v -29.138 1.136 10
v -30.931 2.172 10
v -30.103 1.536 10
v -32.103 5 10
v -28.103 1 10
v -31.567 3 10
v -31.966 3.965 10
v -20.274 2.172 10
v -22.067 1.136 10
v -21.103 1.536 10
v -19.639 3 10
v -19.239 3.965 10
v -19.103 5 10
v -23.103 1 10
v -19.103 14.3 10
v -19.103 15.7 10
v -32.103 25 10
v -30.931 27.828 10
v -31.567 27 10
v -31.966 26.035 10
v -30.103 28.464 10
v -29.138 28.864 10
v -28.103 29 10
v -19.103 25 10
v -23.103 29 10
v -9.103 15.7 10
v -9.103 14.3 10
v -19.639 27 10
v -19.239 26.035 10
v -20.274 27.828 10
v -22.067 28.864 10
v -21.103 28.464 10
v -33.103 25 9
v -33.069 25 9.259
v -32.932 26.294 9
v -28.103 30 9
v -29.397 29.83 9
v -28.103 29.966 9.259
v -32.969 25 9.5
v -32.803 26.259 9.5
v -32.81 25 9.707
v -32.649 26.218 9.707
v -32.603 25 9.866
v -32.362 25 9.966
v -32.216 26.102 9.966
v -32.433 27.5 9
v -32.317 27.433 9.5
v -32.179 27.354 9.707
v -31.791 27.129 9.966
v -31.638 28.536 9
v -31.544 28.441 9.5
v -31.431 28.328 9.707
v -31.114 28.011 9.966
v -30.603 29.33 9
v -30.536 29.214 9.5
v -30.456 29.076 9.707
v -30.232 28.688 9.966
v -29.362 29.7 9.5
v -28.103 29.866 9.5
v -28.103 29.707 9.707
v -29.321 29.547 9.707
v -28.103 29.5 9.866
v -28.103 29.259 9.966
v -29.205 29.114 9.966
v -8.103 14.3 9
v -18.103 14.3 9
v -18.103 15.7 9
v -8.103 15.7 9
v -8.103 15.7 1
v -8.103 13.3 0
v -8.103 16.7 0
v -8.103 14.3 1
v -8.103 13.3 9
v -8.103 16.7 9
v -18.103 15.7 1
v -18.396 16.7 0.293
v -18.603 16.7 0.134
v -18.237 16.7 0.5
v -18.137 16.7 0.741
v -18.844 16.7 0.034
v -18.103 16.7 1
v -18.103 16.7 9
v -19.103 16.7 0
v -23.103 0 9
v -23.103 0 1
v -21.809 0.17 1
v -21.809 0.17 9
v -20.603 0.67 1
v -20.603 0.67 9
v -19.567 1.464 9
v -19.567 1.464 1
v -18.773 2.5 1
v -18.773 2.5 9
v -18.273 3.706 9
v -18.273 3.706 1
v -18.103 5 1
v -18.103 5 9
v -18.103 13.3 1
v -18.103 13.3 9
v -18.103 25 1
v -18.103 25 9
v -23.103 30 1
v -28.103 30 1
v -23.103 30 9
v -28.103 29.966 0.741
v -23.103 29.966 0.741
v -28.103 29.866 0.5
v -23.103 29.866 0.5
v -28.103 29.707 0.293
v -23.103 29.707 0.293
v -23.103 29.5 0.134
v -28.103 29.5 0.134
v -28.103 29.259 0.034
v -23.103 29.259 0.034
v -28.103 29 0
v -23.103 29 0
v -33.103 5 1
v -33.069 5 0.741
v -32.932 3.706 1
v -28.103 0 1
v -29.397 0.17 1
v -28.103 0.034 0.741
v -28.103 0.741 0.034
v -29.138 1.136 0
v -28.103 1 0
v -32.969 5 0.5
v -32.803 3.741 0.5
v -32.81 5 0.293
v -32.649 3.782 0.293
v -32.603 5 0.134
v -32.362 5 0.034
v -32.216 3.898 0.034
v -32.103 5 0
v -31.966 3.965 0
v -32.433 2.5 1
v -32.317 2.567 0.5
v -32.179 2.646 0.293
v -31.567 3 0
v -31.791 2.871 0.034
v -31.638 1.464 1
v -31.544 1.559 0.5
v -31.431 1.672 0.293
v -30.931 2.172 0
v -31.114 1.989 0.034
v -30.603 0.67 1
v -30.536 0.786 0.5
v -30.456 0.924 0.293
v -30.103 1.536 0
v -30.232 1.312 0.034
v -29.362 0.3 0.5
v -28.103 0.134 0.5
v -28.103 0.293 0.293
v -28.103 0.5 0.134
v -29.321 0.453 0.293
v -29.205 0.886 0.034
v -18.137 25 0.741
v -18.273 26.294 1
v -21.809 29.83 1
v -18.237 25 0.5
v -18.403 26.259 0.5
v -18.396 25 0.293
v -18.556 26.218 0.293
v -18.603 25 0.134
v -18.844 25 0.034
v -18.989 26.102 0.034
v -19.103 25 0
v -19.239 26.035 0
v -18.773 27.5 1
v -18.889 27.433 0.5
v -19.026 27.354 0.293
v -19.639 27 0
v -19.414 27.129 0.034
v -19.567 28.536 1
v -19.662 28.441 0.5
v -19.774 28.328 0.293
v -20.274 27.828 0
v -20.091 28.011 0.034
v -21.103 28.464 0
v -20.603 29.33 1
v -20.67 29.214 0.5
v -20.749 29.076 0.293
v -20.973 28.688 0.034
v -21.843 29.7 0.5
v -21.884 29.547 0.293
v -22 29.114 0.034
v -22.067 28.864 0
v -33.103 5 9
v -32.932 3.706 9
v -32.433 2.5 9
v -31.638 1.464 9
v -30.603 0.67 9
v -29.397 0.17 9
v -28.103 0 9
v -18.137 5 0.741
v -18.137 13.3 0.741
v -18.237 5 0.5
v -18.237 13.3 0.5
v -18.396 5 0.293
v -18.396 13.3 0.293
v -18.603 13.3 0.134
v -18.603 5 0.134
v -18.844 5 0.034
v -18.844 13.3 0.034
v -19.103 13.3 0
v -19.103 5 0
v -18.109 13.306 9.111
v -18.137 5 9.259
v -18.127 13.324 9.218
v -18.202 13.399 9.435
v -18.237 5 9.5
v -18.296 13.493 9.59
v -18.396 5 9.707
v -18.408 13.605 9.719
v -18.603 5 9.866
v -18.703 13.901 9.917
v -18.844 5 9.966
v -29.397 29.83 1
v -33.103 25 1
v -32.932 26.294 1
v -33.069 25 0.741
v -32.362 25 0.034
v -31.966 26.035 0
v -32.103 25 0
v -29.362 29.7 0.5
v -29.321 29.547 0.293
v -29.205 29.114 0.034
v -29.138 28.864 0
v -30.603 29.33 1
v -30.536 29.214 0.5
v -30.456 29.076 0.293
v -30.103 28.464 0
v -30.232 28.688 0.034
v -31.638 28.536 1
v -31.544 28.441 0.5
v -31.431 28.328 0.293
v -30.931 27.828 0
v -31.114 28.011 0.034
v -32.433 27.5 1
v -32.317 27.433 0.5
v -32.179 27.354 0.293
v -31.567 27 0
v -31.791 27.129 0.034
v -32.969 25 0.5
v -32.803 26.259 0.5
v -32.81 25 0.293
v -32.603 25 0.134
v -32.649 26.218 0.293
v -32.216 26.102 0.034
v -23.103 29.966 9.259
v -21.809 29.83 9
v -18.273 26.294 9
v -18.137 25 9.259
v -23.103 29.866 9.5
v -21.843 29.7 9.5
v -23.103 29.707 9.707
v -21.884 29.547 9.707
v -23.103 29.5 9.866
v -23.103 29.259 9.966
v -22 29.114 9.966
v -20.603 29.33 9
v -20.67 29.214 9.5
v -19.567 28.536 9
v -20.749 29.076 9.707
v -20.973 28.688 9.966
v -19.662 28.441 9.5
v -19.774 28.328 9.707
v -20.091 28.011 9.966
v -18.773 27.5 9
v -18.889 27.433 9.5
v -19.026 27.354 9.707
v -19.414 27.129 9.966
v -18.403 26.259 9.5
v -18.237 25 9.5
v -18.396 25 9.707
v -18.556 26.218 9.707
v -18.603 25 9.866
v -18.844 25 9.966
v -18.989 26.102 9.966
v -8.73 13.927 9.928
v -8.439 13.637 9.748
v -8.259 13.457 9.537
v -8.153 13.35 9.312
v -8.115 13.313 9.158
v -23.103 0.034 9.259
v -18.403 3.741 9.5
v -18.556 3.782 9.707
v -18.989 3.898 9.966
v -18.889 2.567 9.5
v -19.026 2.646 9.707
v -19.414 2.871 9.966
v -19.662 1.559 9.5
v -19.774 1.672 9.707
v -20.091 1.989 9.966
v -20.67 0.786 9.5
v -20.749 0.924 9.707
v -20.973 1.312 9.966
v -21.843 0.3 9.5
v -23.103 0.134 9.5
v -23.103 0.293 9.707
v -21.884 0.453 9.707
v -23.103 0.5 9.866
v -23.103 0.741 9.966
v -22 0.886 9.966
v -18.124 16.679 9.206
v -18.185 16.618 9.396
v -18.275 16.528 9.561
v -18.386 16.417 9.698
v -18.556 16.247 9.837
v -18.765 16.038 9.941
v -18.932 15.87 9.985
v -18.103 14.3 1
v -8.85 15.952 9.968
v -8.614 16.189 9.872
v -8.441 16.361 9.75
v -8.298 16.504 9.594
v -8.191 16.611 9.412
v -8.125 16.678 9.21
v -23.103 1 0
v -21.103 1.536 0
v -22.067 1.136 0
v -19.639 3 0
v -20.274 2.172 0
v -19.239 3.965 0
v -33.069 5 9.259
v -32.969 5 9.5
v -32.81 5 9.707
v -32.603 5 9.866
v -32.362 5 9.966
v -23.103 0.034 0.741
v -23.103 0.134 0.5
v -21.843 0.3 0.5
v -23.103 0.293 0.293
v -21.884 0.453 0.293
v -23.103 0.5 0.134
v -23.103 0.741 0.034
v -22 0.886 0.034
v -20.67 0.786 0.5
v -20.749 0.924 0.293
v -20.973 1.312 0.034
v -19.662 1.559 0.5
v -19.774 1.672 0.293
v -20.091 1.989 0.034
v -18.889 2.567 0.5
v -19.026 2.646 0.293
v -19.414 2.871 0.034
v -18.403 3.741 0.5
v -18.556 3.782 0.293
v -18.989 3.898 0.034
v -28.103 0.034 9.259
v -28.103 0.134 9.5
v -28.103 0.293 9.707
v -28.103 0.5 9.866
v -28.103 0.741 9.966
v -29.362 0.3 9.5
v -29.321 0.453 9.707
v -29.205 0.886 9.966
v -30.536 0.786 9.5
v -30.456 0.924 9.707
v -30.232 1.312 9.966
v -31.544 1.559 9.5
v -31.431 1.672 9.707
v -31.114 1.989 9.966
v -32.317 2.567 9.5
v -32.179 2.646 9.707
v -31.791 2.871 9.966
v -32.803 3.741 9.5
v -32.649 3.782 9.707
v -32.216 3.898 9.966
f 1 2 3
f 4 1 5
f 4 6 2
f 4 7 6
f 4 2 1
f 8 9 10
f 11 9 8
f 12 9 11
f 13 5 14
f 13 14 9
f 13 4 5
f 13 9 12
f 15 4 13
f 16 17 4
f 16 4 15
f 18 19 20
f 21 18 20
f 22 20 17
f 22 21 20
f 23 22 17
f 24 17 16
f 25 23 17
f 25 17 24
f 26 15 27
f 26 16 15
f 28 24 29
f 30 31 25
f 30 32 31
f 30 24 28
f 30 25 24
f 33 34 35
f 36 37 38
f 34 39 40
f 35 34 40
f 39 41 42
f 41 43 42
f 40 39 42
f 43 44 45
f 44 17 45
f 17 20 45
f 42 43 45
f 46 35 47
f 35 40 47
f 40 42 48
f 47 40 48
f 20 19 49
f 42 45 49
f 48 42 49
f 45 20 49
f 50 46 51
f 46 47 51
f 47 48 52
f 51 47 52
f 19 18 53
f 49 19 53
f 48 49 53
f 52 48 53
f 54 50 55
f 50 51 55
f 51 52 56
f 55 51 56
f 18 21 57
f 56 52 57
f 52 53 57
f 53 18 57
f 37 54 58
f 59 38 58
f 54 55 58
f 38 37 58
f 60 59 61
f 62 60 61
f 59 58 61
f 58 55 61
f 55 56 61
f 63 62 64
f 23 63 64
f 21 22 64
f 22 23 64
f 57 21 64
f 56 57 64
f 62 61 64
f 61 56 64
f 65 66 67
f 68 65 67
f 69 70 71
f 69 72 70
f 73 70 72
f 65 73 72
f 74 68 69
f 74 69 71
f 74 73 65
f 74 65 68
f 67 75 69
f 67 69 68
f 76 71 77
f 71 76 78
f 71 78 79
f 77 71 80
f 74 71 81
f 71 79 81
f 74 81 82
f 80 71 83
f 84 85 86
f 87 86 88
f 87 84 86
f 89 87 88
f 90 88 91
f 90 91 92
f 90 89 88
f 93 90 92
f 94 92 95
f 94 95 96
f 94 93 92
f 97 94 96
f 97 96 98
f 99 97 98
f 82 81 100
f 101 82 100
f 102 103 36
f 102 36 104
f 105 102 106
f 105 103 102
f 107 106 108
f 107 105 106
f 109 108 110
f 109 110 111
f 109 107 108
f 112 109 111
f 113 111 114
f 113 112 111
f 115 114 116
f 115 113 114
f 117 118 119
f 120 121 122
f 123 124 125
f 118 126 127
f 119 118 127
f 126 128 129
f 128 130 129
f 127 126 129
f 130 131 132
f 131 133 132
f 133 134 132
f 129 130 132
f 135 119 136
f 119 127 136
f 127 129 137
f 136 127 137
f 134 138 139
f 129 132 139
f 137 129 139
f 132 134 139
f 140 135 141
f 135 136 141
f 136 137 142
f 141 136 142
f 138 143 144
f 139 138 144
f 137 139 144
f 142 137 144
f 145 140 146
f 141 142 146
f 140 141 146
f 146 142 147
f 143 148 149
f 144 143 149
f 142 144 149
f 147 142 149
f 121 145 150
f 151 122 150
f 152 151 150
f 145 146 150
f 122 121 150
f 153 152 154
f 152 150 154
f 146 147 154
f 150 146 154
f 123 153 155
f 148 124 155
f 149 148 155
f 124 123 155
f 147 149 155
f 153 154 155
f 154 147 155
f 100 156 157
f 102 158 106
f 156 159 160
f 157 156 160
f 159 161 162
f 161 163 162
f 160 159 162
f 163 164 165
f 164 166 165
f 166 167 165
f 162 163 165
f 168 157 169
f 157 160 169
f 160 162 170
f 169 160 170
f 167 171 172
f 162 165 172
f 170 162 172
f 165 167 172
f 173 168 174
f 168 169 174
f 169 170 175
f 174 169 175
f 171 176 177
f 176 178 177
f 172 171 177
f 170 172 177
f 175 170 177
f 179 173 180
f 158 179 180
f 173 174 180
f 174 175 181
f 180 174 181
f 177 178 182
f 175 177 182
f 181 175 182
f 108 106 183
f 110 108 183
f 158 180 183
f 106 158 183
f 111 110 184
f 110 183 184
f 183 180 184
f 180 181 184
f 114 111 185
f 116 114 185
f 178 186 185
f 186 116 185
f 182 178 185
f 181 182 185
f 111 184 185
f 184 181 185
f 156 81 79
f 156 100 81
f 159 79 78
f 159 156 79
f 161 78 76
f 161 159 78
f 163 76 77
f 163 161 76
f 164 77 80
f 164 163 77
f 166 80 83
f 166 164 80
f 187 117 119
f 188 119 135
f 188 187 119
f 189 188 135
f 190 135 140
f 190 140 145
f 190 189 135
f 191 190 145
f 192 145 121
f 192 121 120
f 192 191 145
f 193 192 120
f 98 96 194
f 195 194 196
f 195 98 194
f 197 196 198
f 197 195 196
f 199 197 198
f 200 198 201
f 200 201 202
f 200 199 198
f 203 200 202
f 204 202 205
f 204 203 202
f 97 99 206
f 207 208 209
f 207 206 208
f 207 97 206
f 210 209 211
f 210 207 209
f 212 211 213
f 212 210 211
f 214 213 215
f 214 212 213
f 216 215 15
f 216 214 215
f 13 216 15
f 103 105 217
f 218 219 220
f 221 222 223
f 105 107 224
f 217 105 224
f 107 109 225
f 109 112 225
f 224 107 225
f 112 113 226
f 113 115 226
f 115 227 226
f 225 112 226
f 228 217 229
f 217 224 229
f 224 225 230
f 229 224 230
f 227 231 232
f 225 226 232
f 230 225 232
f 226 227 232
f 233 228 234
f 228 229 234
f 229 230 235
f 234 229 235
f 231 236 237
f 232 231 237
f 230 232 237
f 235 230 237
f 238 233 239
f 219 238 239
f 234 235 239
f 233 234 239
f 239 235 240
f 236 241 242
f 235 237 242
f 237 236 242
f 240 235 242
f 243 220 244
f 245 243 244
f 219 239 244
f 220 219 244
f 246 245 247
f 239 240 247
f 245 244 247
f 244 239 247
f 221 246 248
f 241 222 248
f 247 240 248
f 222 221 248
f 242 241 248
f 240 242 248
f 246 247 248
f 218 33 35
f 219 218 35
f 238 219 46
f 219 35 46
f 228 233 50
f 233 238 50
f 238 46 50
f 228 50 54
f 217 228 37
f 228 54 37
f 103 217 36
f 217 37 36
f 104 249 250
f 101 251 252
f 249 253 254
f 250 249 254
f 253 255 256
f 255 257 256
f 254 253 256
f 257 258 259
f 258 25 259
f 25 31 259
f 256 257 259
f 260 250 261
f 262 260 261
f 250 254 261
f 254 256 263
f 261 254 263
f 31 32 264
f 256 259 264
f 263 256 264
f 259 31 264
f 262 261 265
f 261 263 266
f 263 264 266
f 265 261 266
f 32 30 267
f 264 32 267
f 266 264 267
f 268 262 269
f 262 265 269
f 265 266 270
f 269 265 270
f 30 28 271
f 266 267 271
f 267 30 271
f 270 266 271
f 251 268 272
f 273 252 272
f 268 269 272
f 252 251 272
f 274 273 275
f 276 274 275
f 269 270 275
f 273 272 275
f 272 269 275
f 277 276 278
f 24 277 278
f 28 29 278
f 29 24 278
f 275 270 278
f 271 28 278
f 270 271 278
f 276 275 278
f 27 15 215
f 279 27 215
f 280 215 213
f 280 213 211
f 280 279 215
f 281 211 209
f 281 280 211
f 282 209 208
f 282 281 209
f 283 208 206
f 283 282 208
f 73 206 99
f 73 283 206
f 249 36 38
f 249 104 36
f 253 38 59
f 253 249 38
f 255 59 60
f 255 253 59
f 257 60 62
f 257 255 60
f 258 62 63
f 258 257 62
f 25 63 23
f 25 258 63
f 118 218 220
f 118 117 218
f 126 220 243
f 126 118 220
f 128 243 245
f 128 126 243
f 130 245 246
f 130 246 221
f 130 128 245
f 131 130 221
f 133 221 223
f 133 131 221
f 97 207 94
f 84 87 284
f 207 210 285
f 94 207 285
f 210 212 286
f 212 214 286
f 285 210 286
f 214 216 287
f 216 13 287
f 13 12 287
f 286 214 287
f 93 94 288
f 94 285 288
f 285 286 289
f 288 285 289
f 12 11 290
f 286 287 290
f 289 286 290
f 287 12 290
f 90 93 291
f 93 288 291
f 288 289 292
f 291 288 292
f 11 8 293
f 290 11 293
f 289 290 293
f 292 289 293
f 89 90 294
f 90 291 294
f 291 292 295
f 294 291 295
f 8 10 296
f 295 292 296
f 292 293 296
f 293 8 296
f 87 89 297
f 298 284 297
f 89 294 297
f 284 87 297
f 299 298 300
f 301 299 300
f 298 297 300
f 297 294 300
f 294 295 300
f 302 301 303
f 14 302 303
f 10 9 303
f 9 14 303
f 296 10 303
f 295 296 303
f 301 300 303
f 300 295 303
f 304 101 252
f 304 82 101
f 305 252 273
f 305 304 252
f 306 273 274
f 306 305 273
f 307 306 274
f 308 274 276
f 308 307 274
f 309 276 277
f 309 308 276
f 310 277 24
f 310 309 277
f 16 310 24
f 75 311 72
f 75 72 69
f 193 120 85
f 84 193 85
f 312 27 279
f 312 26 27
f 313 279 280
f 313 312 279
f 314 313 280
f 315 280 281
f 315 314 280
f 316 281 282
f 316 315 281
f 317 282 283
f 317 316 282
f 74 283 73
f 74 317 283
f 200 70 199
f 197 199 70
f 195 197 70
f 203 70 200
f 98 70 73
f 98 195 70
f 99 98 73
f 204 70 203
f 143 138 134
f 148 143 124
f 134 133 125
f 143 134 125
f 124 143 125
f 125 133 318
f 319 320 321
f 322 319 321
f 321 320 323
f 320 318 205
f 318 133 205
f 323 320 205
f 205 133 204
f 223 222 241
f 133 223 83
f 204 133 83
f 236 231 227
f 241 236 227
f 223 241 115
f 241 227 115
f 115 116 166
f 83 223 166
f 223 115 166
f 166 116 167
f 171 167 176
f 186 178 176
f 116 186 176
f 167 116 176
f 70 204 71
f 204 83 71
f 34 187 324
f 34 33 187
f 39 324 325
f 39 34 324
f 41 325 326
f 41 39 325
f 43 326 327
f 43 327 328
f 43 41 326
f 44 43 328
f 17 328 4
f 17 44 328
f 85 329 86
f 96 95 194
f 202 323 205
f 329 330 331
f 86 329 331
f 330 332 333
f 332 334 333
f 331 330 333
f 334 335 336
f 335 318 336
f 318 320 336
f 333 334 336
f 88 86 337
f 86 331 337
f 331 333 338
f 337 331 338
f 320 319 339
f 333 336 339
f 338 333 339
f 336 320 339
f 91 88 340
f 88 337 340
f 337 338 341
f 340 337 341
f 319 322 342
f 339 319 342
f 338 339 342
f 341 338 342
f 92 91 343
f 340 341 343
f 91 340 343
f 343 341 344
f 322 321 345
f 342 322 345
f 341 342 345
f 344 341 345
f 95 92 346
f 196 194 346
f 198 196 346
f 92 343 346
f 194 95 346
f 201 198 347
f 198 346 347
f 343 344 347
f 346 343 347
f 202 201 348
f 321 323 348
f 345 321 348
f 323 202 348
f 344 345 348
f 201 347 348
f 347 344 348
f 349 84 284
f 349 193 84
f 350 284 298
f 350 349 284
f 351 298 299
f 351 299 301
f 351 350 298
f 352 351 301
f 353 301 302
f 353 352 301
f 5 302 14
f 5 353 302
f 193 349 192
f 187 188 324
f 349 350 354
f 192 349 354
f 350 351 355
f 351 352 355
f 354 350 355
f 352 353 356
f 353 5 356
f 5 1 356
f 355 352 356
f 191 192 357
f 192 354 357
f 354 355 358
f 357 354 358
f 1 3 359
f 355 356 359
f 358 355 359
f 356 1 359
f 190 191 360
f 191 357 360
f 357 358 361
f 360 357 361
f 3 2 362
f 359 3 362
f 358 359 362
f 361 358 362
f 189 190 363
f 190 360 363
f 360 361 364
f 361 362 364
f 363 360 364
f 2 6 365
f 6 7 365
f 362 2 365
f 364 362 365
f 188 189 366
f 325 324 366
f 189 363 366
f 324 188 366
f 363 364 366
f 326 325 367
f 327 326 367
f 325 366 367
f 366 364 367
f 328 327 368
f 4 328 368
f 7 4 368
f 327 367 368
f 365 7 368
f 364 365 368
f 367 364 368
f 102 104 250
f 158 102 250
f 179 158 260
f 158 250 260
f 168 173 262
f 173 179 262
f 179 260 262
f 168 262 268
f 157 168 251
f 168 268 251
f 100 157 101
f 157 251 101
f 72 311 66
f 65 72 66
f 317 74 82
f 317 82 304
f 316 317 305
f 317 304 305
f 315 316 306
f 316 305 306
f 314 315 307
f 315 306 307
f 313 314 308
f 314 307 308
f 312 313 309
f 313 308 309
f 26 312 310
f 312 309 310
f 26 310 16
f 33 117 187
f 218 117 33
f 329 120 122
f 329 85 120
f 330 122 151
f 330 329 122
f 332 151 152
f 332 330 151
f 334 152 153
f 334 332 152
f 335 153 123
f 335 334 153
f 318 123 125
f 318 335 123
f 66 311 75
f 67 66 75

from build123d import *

# Parameters (mm, degrees)
F0_W     = 15
F0_H     = 30
F1_DEPTH = 10
F2_W     = 3.4
F2_H     = 10
F2_W_2   = 1.4
F2_H_2   = 8
F3_DEPTH = 10
F4_R     = 5
F5_R     = 1
F6_R     = 0.99999


# Not quite as in the source:
# - a fillet or chamfer is up to 0.001 mm smaller than in the source, because OpenCascade refuses the exact size


with BuildPart() as f1:
    # F0 (on Top) → F1 (new body)
    with BuildSketch(Plane.XY):
        with Locations((-25.6027433276, 15)):
            Rectangle(F0_W, F0_H)
    extrude(amount=F1_DEPTH)

    # F2 (on face) → F3 (join)
    with BuildSketch(Plane.YZ.offset(-18.1027433276)):
        with Locations((15, 5)):
            Rectangle(F2_W, F2_H)
        with Locations((15, 5)):
            Rectangle(F2_W_2, F2_H_2, mode=Mode.SUBTRACT)
    extrude(amount=F3_DEPTH)

    # F4
    f4_edges = [f1.edges().sort_by_distance(p)[0] for p in [
        (-18.102743, 30, 5),
        (-33.102743, 30, 5),
        (-33.102743, 0, 5),
        (-18.102743, 0, 5),
    ]]
    fillet(f4_edges, radius=F4_R)

    # F5
    f5_edges = [f1.edges().sort_by_distance(p)[0] for p in [
        (-33.102743, 15, 10),
        (-31.638277, 28.535534, 10),
        (-25.602743, 30, 10),
        (-19.567209, 28.535534, 10),
        (-18.102743, 20.85, 10),
        (-18.102743, 9.15, 10),
        (-19.567209, 1.464466, 10),
        (-25.602743, 0, 10),
        (-31.638277, 1.464466, 10),
    ]]
    fillet(f5_edges, radius=F5_R)

    # F6 (radius 1 in the source; OpenCascade refuses exactly that, so slightly less here)
    f6_edges = [f1.edges().sort_by_distance(p)[0] for p in [
        (-18.102743, 20.85, 0),
        (-18.102743, 9.15, 0),
        (-19.567209, 1.464466, 0),
        (-25.602743, 0, 0),
        (-31.638277, 1.464466, 0),
        (-33.102743, 15, 0),
        (-31.638277, 28.535534, 0),
        (-25.602743, 30, 0),
        (-19.567209, 28.535534, 0),
        (-18.602743, 16.7, 10),
        (-13.102743, 16.7, 10),
        (-19.102743, 20.85, 10),
        (-8.102743, 15, 10),
        (-20.274316, 27.828427, 10),
        (-13.102743, 13.3, 10),
        (-25.602743, 29, 10),
        (-18.602743, 13.3, 10),
        (-30.93117, 27.828427, 10),
        (-19.102743, 9.15, 10),
        (-32.102743, 15, 10),
        (-20.274316, 2.171573, 10),
        (-30.93117, 2.171573, 10),
        (-25.602743, 1, 10),
    ]]
    fillet(f6_edges, radius=F6_R)


solid = f1.part
